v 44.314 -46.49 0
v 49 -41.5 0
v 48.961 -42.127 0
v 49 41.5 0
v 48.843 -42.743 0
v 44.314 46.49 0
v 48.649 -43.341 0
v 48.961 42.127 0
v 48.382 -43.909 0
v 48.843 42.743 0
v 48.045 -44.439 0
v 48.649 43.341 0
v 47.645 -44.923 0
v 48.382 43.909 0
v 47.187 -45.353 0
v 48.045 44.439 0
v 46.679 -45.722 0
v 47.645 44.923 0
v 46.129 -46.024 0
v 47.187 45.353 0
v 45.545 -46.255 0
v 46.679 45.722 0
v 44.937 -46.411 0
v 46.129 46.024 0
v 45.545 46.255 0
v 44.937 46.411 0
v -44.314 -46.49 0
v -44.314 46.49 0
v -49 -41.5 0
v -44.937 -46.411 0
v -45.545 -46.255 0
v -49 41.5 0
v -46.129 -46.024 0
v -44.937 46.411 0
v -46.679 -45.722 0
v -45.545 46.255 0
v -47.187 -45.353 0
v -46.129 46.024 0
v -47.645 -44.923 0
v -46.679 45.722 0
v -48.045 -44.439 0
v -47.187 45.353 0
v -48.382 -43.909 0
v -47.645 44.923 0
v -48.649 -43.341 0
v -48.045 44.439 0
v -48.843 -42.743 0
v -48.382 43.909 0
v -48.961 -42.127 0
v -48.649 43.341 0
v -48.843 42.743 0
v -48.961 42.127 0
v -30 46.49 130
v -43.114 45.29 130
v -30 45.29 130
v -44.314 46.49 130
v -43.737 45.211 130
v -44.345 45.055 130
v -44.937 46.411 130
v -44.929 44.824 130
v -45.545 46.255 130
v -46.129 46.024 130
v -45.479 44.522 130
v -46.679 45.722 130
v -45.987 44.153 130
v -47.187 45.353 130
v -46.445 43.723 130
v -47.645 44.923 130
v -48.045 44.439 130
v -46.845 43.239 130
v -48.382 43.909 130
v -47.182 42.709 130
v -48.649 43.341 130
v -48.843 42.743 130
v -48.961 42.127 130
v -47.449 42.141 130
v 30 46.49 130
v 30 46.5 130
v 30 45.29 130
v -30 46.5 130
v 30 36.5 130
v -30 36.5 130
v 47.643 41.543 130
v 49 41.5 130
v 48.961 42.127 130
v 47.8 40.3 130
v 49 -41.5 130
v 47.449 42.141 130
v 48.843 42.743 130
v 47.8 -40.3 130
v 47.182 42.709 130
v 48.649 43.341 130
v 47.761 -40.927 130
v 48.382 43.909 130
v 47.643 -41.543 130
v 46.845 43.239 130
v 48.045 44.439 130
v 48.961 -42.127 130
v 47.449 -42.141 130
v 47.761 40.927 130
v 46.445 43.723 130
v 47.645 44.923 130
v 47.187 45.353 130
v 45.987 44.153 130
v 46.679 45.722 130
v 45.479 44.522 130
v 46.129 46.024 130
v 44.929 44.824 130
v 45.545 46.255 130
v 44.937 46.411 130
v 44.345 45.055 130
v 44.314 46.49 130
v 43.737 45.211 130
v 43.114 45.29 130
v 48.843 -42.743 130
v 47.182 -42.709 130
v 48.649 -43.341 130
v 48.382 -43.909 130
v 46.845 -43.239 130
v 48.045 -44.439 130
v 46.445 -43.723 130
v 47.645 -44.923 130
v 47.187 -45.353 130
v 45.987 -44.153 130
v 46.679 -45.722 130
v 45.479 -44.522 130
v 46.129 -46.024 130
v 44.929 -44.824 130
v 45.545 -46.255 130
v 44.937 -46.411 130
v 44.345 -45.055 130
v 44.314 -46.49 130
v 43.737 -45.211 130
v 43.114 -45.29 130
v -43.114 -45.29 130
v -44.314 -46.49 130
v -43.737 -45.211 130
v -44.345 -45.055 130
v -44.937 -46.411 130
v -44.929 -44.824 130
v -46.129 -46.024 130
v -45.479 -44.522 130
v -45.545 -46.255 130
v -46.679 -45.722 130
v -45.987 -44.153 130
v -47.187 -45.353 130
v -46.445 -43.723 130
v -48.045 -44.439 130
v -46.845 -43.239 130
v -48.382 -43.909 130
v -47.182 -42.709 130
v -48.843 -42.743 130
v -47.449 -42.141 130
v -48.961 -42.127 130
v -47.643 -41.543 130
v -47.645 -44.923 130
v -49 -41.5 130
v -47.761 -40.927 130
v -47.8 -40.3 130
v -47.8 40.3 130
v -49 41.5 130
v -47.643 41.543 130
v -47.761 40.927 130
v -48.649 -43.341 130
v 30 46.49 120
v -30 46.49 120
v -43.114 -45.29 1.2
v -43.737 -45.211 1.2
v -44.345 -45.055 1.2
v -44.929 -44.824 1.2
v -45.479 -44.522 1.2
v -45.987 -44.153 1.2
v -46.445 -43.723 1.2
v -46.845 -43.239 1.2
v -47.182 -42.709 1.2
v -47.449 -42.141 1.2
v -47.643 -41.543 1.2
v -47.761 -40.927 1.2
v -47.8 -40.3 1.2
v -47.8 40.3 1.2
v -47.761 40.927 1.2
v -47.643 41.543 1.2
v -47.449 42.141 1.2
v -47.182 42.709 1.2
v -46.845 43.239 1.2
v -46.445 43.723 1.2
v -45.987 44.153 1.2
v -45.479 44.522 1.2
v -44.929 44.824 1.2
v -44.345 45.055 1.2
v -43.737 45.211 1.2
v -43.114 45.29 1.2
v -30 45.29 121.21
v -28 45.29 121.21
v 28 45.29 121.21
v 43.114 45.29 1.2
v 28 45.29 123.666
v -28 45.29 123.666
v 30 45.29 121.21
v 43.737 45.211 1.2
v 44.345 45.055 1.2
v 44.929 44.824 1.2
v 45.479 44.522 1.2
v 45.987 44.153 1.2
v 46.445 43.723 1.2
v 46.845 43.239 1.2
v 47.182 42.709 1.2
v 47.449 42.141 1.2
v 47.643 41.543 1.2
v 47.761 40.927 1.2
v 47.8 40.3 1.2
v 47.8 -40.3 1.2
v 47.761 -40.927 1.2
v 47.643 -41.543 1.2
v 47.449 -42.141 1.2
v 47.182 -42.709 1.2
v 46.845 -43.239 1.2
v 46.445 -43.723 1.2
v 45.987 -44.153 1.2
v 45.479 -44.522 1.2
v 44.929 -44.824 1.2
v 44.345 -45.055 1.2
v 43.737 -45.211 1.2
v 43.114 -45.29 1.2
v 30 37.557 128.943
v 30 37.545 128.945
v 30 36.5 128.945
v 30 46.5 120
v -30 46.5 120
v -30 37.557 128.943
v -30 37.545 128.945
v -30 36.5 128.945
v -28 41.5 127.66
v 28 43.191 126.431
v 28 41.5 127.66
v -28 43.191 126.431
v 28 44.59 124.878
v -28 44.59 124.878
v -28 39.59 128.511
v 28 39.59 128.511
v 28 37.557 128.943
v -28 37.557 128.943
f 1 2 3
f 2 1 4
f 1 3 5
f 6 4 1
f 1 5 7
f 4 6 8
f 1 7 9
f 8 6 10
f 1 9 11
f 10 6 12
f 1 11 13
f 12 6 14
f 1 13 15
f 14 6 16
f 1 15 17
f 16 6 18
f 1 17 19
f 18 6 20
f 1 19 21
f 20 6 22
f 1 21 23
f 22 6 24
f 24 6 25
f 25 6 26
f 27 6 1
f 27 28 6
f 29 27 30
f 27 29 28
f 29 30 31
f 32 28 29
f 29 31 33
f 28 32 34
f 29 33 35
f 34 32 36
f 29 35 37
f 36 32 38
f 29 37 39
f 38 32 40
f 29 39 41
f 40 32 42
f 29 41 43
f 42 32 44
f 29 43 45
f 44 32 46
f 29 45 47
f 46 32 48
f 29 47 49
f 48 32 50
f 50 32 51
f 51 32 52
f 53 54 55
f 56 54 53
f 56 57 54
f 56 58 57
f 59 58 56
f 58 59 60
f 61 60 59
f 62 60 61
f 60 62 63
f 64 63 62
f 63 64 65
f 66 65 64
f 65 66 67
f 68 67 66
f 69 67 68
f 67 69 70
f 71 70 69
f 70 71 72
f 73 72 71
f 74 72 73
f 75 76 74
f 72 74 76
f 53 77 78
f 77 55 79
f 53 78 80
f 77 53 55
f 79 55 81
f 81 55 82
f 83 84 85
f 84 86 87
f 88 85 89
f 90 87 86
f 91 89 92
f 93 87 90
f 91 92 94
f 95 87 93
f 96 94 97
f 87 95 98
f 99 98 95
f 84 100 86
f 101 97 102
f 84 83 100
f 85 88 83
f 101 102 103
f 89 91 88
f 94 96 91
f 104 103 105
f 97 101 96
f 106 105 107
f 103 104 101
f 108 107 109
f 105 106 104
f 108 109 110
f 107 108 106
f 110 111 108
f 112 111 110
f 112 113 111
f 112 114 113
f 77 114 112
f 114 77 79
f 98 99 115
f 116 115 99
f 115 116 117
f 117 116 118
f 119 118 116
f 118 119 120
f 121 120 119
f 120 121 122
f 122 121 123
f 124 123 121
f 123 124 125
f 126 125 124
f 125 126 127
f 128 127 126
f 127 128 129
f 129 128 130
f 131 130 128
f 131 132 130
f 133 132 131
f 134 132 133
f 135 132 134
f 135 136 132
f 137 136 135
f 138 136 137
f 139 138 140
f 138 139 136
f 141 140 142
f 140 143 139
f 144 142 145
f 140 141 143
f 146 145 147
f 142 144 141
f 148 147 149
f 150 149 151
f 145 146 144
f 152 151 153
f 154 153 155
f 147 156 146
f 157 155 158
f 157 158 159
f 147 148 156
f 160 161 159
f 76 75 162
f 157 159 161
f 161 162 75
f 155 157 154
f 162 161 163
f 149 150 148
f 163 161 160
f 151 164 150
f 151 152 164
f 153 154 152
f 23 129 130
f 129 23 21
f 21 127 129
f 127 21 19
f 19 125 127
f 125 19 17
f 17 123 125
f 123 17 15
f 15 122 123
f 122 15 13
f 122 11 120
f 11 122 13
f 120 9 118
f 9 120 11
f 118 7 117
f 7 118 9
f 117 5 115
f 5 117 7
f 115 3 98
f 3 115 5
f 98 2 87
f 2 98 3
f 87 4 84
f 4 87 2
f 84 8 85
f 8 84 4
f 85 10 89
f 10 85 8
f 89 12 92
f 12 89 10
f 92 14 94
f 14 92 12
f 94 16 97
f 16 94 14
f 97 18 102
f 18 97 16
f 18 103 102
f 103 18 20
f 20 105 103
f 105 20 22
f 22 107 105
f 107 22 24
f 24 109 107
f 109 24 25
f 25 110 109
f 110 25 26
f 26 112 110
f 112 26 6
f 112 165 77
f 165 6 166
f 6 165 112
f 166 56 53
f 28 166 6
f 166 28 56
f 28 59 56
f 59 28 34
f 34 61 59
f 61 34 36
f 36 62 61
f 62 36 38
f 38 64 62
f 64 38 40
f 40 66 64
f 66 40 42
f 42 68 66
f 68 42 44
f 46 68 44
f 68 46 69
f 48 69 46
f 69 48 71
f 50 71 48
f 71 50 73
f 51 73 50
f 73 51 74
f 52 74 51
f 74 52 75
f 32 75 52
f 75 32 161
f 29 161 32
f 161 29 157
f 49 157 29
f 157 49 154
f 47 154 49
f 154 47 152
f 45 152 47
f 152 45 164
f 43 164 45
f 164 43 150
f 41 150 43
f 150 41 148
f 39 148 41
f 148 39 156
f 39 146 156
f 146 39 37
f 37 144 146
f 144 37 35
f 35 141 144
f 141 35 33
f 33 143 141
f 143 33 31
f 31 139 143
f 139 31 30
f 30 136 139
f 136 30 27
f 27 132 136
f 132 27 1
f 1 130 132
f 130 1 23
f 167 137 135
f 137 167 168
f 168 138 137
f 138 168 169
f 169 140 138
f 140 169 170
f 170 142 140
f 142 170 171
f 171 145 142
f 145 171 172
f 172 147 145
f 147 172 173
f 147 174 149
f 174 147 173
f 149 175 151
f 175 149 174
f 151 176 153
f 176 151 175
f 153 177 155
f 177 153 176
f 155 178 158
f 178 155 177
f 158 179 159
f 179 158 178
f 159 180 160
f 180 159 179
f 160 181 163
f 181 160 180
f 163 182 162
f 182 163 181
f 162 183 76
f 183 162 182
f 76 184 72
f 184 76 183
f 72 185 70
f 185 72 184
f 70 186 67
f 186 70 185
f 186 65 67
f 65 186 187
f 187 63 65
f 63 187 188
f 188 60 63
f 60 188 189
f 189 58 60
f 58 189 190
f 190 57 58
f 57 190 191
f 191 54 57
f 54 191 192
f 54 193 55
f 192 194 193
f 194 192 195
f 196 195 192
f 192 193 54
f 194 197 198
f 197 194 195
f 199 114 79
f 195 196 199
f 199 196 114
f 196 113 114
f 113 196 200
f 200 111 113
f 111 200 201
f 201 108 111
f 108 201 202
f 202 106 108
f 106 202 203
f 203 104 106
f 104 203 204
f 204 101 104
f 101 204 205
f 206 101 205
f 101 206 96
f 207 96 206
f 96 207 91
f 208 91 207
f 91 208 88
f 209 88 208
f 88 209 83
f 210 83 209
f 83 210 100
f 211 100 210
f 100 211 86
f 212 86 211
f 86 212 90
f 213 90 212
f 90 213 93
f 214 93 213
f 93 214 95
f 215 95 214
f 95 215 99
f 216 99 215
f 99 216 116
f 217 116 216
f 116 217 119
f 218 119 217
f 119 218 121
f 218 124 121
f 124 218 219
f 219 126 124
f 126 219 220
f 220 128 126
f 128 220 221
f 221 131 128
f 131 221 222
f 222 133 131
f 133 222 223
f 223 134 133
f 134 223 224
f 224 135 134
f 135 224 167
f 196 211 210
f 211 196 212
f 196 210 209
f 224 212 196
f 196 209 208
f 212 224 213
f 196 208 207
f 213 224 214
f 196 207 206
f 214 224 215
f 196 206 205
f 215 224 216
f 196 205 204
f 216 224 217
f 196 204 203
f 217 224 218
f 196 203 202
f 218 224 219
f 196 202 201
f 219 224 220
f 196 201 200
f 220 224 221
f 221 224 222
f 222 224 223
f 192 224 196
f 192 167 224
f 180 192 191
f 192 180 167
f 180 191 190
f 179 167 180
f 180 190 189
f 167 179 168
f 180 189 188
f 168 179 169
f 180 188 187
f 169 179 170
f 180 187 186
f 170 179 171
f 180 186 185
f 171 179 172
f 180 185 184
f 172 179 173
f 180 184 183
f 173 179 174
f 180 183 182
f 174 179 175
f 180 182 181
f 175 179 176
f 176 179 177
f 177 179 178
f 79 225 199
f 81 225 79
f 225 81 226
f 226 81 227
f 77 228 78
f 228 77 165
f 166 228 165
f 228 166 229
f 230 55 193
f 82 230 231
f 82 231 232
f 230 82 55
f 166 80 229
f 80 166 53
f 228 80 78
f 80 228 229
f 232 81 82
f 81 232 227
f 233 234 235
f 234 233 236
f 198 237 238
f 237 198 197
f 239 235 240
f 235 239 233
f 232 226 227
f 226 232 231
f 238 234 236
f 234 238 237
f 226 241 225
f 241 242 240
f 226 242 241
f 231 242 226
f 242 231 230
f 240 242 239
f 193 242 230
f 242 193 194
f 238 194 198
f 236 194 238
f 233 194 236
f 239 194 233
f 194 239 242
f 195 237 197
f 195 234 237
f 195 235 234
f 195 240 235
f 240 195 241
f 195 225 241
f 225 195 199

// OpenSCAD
// file: ../../lib/shelf.scad
module shelf(width, depth, height) {
  difference() {
    cube([ width, depth, height ]);

    translate([ width / 2, 0, -1 ]) rotate([ 90, 0, 90 ])
        cylinder(h = width + 1, r = depth, center = true);
  };

  triangle_width = 2;

  // Left triangle
  shelf_triangle(depth, triangle_width);

  // Right triangle
  translate([ width - triangle_width, 0, 0 ])
      shelf_triangle(depth, triangle_width);
}

module shelf_triangle(size, triangle_width) {
  rotate([ 90, 0, 90 ]) linear_extrude(triangle_width)
      polygon([[size, size], [0, size], [size, 0]]);
}
// file: ../../lib/rounded.scad
$fn=50;

module rounded_rectangle(width, height, radius) {
    minkowski() {
        square([width - radius*2, height - radius*2], center=true);
        circle(radius);
    }
}

module rounded_rectangle_border(width, height, radius, wall_width) {
    difference() {
      rounded_rectangle(width, height, radius);
      rounded_rectangle(width - wall_width*2, height - wall_width*2, radius);
    }
}

module rounded_cube(width, depth, height, radius) {
    minkowski() {
        cube([width - radius*2, depth - radius*2, height - radius*2], center=true);
        sphere(radius);
    }
}

module half_rounded_cube(width, depth, height, radius) {
    intersection() {
        rounded_cube(width, depth, height*2, radius);

        translate([-width/2, -depth/2, 0])
        cube([width, depth, height]);
    }
}

module quarter_rounded_cube(width, depth, height, radius) {
    intersection() {
        rounded_cube(width, depth*2, height*2, radius);

        translate([-width/2, 0, 0])
        cube([width, depth, height]);
    }
}

module negative_edge(width, radius) {
    difference() {
        cube([width, radius, radius], center = true);

        translate([0, radius/2, radius/2])
        rotate([0,90,0])
        cylinder(h = width + 0.1, r = radius, center = true);
    }
}


module rounded_edge(width, depth, height, radius) {
    assert(radius <= height, "Radius must be less or equal to the height");
    union() {
        translate([0, radius, 0])
        cube([width, depth - radius, height]);

        cube([width, radius, height - radius]);

        translate([0, radius, (height - radius)])
        quarter_cylinder(height = width, radius = radius);
    }
}

module centered_rounded_edge(width, depth, height, radius) {
    translate([-width/2, -depth/2, -height/2])
    rounded_edge(width, depth, height, radius);
}

module quarter_cylinder(height, radius) {
    rotate([90, -90, 90])
    rotate_extrude(angle = 90)
    square([radius, height]);
}

//cube([10,20,30]);
//rounded_cube(30, 50, 12, 5);
//half_rounded_cube(30, 50, 6, 5);
//quarter_rounded_cube(30, 25, 6, 5);
//centered_rounded_edge(100, 30, 12, 11);
//half_cylinder(30, 5);
//negative_edge(40, 5);
// main file
fn = 50;

use <../../lib/rounded.scad>
use <../../lib/shelf.scad>

module box(width, depth, height, radius, wall_width) {
  linear_extrude(height) {
    rounded_rectangle_border(width, depth, radius, wall_width);
  }

  linear_extrude(wall_width) { rounded_rectangle(width, depth, radius); }
}

module box_with_label(width, depth, height, radius, wall_width) {
  box(width, depth, height, radius, wall_width);

  label_width = 60;
  label_depth = 10;
  label_height = 10;

  translate(
      [ -label_width / 2, depth / 2 - label_depth, height - label_height ]) {
    shelf(label_width, label_depth, label_height);
  }
}

box_with_label(width = 98, depth = 93, height = 130, radius = 5,
               wall_width = 1.2);
